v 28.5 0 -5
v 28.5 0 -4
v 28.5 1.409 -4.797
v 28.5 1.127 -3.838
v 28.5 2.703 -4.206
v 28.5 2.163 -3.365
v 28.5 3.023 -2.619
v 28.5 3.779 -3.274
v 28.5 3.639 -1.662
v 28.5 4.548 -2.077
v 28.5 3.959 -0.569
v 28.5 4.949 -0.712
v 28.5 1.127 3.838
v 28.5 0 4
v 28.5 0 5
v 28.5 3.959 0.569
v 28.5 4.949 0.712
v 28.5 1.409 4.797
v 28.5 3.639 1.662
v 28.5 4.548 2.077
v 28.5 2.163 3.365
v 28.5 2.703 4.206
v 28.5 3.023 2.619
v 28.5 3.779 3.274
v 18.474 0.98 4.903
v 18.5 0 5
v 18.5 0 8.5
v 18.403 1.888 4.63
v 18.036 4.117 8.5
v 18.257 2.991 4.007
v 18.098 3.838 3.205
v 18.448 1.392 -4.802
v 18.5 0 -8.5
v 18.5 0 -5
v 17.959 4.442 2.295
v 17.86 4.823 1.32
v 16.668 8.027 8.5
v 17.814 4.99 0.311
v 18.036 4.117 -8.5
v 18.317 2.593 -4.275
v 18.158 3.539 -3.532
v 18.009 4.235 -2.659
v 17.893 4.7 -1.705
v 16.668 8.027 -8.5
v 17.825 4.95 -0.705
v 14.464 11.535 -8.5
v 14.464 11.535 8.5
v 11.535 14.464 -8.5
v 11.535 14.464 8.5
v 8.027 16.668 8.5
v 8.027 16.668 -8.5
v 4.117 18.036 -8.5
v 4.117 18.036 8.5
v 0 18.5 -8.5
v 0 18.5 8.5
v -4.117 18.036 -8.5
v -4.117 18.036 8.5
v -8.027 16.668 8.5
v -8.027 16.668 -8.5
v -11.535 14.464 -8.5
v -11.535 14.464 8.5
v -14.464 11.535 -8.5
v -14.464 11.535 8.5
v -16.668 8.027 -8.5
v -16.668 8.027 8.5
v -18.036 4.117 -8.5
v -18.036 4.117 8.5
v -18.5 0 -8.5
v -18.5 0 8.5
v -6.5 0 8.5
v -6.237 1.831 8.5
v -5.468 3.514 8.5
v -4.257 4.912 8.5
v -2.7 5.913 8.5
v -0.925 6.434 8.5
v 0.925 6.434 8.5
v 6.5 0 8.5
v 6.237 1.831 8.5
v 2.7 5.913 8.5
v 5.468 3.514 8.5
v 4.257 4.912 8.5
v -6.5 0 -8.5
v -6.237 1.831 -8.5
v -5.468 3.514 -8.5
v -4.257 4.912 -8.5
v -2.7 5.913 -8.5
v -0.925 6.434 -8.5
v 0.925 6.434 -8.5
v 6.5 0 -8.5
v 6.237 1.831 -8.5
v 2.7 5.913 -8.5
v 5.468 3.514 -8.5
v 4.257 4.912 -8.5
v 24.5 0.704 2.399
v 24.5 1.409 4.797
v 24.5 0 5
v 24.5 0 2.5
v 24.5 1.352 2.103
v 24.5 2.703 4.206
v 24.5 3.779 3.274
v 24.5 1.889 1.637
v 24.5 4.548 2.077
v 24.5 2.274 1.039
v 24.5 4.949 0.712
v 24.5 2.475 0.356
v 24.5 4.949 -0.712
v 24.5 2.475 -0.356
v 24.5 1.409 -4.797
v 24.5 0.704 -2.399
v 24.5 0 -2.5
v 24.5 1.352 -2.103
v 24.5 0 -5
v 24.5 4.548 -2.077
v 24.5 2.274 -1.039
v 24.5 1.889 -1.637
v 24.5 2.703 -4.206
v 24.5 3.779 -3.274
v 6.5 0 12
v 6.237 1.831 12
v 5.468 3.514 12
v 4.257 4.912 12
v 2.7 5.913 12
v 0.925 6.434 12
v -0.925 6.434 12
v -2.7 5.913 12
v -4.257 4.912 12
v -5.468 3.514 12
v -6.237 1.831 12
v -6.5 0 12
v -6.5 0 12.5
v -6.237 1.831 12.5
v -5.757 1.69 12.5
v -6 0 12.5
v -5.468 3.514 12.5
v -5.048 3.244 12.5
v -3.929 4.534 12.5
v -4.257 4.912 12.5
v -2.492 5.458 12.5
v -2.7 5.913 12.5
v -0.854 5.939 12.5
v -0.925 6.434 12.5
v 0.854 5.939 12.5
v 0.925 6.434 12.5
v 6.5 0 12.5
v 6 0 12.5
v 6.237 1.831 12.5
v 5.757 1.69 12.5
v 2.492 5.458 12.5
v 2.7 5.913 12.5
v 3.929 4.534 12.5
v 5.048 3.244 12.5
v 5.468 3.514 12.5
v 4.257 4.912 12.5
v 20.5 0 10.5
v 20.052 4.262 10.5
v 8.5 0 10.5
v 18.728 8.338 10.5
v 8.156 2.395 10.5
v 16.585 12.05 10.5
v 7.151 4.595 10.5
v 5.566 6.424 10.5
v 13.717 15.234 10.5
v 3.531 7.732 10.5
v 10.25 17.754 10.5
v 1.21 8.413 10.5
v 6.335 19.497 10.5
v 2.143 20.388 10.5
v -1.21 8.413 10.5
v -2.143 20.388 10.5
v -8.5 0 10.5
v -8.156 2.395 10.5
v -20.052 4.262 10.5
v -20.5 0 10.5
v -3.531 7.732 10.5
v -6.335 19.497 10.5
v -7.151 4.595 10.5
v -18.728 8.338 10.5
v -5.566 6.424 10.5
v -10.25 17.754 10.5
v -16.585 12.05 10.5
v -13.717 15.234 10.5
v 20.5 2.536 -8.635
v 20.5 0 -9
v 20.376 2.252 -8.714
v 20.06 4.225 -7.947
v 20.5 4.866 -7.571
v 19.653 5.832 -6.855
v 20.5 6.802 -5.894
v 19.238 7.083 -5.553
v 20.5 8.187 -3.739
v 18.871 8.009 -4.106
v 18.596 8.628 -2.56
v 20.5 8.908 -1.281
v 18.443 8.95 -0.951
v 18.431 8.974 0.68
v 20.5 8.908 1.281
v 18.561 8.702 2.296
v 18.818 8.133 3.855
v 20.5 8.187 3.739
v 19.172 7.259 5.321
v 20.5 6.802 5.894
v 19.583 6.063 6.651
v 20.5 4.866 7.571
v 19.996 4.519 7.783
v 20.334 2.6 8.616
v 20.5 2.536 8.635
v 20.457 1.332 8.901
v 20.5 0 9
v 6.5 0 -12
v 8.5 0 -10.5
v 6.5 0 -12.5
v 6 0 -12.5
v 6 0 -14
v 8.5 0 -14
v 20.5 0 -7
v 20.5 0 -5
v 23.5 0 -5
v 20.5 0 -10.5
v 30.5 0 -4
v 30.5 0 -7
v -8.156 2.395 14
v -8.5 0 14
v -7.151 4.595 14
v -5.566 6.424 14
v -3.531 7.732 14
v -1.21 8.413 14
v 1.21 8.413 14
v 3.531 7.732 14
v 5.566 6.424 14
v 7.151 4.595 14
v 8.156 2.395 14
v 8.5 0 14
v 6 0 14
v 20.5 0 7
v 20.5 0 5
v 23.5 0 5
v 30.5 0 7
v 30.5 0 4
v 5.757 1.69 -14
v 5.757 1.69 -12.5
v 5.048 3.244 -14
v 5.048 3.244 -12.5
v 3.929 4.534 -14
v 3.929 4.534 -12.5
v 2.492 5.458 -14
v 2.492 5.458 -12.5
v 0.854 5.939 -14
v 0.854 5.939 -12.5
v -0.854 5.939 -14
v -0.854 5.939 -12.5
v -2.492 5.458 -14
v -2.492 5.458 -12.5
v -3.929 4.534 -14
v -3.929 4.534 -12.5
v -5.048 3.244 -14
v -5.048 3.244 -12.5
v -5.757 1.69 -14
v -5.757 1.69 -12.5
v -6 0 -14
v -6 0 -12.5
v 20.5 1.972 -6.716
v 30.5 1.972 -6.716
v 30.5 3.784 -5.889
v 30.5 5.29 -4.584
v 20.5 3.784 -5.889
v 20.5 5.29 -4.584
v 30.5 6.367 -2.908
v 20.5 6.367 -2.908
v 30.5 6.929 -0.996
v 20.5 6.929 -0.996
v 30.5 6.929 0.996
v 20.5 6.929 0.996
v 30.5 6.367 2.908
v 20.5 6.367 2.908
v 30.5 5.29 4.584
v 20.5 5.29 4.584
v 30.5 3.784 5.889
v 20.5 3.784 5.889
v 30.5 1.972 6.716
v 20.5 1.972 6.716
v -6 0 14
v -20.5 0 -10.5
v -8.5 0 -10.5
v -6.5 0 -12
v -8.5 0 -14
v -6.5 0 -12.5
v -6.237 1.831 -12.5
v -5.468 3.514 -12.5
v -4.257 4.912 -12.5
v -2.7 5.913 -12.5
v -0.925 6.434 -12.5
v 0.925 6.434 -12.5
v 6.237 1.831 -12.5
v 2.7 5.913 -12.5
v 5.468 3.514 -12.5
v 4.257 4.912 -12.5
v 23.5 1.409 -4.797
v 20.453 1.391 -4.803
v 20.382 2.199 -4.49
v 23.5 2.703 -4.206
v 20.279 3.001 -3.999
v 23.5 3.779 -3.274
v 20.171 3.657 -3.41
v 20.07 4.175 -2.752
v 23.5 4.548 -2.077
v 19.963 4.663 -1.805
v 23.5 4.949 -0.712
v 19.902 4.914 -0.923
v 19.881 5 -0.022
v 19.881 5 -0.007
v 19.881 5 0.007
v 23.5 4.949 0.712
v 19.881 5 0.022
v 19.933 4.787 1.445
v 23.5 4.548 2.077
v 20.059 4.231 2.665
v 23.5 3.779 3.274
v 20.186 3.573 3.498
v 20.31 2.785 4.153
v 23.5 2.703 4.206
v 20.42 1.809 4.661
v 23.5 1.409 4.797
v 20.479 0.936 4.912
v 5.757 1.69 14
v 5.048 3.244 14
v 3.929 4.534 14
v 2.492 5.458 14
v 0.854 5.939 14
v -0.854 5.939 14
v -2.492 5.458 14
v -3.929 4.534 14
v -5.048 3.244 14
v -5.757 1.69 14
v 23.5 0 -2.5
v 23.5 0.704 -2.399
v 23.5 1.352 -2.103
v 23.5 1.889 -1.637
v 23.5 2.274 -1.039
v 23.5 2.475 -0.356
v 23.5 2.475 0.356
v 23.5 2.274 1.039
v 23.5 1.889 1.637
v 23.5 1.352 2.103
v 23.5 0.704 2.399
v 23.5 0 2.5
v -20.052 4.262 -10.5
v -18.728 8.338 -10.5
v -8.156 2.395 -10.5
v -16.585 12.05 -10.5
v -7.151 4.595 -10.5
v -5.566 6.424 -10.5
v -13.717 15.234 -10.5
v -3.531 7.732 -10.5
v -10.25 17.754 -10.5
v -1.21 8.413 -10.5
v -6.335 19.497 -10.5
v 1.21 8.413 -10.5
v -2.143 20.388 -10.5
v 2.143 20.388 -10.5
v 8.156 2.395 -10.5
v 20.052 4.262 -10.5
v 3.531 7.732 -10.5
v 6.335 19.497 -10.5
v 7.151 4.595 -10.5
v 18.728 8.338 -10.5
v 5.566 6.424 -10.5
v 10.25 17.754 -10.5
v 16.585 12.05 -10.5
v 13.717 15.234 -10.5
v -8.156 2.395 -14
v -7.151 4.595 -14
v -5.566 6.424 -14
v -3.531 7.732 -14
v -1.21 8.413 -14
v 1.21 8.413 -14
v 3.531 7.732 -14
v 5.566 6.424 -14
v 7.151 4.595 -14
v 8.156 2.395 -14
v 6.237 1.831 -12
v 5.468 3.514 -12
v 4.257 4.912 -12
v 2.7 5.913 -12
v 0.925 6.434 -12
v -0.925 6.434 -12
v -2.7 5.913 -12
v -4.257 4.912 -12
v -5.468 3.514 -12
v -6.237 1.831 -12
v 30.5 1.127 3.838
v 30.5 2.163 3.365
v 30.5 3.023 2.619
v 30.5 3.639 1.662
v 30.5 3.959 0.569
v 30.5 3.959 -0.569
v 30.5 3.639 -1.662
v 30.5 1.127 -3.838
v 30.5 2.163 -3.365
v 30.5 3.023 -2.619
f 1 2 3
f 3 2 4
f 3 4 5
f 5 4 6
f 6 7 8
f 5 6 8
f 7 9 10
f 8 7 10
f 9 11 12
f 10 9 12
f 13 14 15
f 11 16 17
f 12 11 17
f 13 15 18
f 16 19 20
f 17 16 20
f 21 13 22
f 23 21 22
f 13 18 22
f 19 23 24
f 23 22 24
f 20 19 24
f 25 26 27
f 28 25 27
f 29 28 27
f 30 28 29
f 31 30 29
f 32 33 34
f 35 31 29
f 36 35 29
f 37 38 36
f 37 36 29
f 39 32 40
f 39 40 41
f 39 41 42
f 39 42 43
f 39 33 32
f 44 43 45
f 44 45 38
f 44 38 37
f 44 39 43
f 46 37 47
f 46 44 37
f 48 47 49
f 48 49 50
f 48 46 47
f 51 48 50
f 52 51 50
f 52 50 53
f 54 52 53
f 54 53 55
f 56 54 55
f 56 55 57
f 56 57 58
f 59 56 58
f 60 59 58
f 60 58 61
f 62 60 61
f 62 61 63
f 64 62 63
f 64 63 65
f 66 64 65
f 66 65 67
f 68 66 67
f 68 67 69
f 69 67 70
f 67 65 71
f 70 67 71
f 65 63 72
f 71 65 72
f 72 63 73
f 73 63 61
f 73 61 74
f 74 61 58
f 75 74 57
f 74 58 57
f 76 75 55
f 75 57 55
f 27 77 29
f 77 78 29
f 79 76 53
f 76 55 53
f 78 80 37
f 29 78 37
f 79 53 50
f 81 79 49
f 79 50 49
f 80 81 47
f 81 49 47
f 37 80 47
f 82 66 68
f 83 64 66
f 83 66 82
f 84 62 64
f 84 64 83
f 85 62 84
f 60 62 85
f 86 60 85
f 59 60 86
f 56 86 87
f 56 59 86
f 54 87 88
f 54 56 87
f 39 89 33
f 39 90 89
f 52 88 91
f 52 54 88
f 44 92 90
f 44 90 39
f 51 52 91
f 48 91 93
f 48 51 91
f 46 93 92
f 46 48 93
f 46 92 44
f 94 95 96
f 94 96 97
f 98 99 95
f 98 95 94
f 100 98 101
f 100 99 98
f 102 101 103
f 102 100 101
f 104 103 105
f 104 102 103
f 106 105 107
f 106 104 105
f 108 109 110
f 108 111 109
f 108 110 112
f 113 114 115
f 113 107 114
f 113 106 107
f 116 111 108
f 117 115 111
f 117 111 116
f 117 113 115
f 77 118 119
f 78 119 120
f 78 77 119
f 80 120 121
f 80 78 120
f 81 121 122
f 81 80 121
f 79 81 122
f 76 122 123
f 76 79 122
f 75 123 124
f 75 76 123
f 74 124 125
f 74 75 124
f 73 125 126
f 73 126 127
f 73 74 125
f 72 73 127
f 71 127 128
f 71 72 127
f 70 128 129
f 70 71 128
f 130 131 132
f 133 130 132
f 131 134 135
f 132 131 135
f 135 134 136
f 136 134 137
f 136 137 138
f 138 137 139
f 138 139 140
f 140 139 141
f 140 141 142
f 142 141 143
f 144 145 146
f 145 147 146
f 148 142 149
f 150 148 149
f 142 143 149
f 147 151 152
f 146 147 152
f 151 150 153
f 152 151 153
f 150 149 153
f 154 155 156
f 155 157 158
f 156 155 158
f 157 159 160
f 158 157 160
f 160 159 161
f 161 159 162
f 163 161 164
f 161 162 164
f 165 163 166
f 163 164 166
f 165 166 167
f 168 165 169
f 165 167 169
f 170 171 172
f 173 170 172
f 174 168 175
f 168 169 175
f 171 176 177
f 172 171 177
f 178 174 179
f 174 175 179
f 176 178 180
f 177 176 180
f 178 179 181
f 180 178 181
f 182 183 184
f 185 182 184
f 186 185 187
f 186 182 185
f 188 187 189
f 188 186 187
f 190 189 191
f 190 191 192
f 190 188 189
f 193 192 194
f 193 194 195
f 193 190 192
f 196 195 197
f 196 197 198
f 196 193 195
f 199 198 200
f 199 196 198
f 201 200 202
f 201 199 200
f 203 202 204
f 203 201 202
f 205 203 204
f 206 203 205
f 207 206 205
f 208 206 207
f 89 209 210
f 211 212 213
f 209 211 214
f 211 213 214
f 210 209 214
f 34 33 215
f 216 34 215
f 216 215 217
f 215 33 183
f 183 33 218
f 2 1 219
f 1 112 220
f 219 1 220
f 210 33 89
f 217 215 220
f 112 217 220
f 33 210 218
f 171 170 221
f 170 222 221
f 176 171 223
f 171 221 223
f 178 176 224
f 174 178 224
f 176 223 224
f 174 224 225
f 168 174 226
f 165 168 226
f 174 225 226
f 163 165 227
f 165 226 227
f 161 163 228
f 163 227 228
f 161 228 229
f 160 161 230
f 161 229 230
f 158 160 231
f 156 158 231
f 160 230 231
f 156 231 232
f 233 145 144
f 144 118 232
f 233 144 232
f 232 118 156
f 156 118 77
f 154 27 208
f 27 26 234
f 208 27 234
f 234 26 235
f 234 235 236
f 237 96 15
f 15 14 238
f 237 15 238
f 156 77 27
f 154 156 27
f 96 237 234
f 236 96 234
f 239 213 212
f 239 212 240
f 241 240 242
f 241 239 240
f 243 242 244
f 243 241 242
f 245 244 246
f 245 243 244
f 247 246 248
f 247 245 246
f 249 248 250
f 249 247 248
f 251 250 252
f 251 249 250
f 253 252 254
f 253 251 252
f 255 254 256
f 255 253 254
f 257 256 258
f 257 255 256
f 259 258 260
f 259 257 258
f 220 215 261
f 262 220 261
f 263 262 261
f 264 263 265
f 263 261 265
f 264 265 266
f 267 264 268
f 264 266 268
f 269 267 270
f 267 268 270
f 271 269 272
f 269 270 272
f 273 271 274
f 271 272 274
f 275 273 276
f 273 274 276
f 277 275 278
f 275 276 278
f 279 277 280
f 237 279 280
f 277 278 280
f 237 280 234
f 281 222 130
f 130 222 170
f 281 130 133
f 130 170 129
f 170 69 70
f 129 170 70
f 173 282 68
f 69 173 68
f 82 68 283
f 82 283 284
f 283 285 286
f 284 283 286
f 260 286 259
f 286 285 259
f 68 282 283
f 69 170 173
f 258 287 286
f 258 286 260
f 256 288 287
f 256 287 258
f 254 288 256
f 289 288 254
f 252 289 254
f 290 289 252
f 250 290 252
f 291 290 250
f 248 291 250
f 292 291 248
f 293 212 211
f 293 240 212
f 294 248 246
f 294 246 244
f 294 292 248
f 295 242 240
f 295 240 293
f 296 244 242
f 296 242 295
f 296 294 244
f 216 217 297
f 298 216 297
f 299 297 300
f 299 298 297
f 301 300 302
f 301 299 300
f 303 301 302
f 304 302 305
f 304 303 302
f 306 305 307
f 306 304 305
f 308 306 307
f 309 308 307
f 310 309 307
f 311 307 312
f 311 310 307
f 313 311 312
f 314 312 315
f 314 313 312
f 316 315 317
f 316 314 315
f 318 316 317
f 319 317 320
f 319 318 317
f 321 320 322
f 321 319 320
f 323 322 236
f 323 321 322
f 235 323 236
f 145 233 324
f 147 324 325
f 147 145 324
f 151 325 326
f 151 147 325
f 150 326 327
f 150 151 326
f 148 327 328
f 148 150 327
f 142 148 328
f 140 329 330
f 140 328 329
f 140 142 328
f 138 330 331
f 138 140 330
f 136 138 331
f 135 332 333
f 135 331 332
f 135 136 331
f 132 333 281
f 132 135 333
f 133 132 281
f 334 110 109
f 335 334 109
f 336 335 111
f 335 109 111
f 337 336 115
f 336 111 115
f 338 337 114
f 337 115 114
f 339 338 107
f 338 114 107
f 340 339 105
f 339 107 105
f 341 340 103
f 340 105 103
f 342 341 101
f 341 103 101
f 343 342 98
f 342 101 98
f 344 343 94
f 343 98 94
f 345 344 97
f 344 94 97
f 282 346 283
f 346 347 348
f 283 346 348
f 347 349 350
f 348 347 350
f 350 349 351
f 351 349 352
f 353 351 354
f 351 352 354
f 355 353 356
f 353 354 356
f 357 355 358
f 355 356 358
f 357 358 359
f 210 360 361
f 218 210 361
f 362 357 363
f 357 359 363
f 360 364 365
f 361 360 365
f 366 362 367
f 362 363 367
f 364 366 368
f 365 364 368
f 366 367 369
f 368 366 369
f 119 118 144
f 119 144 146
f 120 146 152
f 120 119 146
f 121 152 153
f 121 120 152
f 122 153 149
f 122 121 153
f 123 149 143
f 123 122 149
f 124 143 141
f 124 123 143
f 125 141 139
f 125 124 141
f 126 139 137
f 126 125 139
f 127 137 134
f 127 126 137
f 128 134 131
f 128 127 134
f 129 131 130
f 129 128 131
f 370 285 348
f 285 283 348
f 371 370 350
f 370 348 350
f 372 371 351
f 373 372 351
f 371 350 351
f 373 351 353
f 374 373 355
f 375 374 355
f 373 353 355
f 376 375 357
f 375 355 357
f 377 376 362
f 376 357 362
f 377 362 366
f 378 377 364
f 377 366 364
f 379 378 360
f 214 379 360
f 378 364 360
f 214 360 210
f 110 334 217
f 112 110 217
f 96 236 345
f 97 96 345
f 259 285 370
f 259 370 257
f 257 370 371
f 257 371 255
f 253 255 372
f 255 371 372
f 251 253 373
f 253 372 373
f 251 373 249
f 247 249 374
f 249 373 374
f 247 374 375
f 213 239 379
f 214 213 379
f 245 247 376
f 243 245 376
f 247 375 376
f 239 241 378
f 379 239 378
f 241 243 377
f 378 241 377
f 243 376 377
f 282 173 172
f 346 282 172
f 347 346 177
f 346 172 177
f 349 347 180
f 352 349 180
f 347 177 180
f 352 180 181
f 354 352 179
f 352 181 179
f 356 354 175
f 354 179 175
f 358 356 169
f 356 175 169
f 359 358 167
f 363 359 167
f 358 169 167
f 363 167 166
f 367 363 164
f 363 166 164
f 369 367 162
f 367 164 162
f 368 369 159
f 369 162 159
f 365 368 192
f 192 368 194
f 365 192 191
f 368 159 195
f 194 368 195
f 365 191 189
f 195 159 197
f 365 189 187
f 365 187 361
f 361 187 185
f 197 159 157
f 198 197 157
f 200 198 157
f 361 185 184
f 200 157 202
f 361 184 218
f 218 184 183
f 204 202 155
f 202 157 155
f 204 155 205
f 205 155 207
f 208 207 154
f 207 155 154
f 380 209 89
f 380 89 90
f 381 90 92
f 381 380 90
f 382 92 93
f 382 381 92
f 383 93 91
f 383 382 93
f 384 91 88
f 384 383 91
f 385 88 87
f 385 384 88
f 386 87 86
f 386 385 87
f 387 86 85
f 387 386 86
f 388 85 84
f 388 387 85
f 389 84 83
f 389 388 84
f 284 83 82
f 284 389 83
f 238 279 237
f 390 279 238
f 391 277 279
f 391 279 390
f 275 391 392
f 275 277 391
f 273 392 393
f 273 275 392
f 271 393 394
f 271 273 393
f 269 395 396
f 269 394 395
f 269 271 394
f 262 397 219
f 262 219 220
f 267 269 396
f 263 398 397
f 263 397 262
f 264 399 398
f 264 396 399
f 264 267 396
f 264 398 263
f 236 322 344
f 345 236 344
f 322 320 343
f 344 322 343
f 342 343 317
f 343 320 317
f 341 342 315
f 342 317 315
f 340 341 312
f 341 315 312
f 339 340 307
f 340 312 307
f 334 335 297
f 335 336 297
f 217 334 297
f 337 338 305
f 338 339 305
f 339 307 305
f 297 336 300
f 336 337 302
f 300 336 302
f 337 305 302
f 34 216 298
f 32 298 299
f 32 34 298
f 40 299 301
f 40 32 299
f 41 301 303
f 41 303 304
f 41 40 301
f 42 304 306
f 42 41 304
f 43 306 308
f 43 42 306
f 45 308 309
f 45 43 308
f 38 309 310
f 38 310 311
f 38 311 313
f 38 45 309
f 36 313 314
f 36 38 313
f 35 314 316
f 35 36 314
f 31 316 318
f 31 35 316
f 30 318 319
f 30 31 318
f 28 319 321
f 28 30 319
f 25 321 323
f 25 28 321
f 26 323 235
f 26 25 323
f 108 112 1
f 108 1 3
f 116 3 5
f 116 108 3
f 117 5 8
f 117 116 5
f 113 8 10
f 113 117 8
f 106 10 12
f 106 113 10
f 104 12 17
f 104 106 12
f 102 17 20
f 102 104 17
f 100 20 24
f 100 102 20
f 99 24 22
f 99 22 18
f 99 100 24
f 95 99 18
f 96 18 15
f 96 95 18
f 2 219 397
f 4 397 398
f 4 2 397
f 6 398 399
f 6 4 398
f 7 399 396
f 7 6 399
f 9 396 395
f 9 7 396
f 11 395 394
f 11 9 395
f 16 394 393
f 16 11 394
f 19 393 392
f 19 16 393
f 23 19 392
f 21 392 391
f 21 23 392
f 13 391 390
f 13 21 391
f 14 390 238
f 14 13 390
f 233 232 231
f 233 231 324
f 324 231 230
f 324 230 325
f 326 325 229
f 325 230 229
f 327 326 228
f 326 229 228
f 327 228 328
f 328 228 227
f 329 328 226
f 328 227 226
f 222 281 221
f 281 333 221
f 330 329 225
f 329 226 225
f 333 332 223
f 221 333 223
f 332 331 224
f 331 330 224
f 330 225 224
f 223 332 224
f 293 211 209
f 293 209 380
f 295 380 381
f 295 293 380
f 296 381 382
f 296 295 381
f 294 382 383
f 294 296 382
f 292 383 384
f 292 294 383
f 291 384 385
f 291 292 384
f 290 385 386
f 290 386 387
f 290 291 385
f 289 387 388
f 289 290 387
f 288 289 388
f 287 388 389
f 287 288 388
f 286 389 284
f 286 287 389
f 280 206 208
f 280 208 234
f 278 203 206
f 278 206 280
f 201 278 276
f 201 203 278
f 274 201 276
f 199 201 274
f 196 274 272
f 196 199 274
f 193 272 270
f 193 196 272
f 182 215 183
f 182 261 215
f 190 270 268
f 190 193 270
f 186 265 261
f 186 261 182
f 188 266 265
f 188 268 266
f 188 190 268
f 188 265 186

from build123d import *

# Parameters (mm, degrees)
REVOLVE1_ANGLE          = 180
SHELL1_START            = -8.5
SHELL1_DEPTH            = 17
SHELL1_START_2          = -12
SHELL1_2_DEPTH          = 24
CUT_EXTRUDE1_DEPTH      = 33.194720064
CUT_EXTRUDE1_DEPTH_BACK = 33.194720064
SKETCH3_R               = 6
BOSS_EXTRUDE1_REACH     = 49.93
SKETCH6_R               = 9
BOSS_EXTRUDE3_DEPTH     = 10
SHELL2_START            = 19.880907618
SHELL2_DEPTH            = 8.619092382
SHELL2_START_2          = -5.0000001
SHELL2_2_DEPTH          = 10.0000001
CUT_EXTRUDE2_REACH      = 41.326
SKETCH8_R               = 5
SKETCH9_R               = 4
CUT_EXTRUDE3_DEPTH      = 10
BOSS_EXTRUDE4_START     = -1
BOSS_EXTRUDE4_DEPTH     = 1
SKETCH11_R              = 2.5
CUT_EXTRUDE4_DEPTH      = 1
CUT_EXTRUDE6_DEPTH      = 12.5
CUT_EXTRUDE6_DEPTH_BACK = 12.5
SKETCH12_R              = 6.5


with BuildPart() as part:
    # Sketch2 → Revolve1 (revolve)
    with BuildSketch(Plane(origin=(0, 0, 0), x_dir=(1, 0, 0), z_dir=(0, 1, 0))):
        Polygon((0, 0), (0, 14), (-8.5, 14), (-8.5, 10.5), (-20.5, 10.5), (-20.5, 0), (-20.5, -10.5), (-8.5, -10.5), (-8.5, -14), (0, -14), align=None)
    revolve(axis=Axis((0, 0, 0), (0, 0, -1)), revolution_arc=REVOLVE1_ANGLE)

    # Shell1: read off the stored shape, not the designer's step
    # Shell1 outline → Shell1 (cut)
    with BuildSketch(Plane.XY.offset(SHELL1_START)):
        with BuildLine():
            ThreePointArc((18.5, 0), (0, 18.5), (-18.5, 0))
            Line((-18.5, 0), (18.5, 0))
        make_face()
    extrude(amount=SHELL1_DEPTH, mode=Mode.SUBTRACT)

    # Shell1 2 outline → Shell1 2 (cut)
    with BuildSketch(Plane.XY.offset(SHELL1_START_2)):
        with BuildLine():
            Line((-6.5, 0), (6.5, 0))
            ThreePointArc((6.5, 0), (0, 6.5), (-6.5, 0))
        make_face()
    extrude(amount=SHELL1_2_DEPTH, mode=Mode.SUBTRACT)

    # Sketch3 → Cut-Extrude1 (cut, two sides: drawn at the far end of the back side and taken through both)
    with BuildSketch(Plane.XY.offset(-CUT_EXTRUDE1_DEPTH_BACK)):
        Circle(SKETCH3_R)
    extrude(amount=CUT_EXTRUDE1_DEPTH + CUT_EXTRUDE1_DEPTH_BACK, mode=Mode.SUBTRACT)

    # Sketch6 → Boss-Extrude1 (add, up to next)
    with BuildSketch(Plane(origin=(20.5, 0, 0), x_dir=(0, 0, -1), z_dir=(1, 0, 0)), mode=Mode.PRIVATE) as boss_extrude1_sk1:
        Circle(SKETCH6_R)
    boss_extrude1_tool1 = extrude(boss_extrude1_sk1.sketch, amount=-BOSS_EXTRUDE1_REACH, mode=Mode.PRIVATE) - part.part
    add(boss_extrude1_tool1.solids().sort_by_distance((20.5, 0, 0))[0])

    # Sketch7 → Boss-Extrude3 (add)
    with BuildSketch(Plane(origin=(20.5, 0, 0), x_dir=(0, 0, -1), z_dir=(1, 0, 0))):
        with BuildLine():
            Line((-7, 0), (7, 0))
            ThreePointArc((7, 0), (0, 7), (-7, 0))
        make_face()
    extrude(amount=BOSS_EXTRUDE3_DEPTH)

    # Shell2: read off the stored shape, not the designer's step
    # Shell2 outline → Shell2 (cut)
    with BuildSketch(Plane.YZ.offset(SHELL2_START)):
        with BuildLine():
            ThreePointArc((0, -5), (5, 0), (0, 5))
            Line((0, 5), (0, -5))
        make_face()
    extrude(amount=SHELL2_DEPTH, mode=Mode.SUBTRACT)

    # Shell2 2 outline → Shell2 2 (add)
    with BuildSketch(Plane.XY.offset(SHELL2_START_2)):
        with BuildLine():
            Line((19.880896081, 4.999997099), (19.880907618, 0))
            Line((19.880907618, 0), (20.5, 0))
            ThreePointArc((20.5, 0), (20.344635284, 2.519090146), (19.880896081, 4.999997099))
        make_face()
    extrude(amount=SHELL2_2_DEPTH)

    # Sketch8 → Cut-Extrude2 (cut, up to next)
    with BuildSketch(Plane(origin=(0, 0, 0), x_dir=(0, 0, -1), z_dir=(1, 0, 0)), mode=Mode.PRIVATE) as cut_extrude2_sk1:
        Circle(SKETCH8_R)
    cut_extrude2_tool1 = extrude(cut_extrude2_sk1.sketch, amount=CUT_EXTRUDE2_REACH, mode=Mode.PRIVATE) & part.part
    add(cut_extrude2_tool1.solids().sort_by_distance((0, 0, 0))[0], mode=Mode.SUBTRACT)

    # Sketch9 → Cut-Extrude3 (cut)
    with BuildSketch(Plane(origin=(20.5, 0, 0), x_dir=(0, 0, -1), z_dir=(1, 0, 0))):
        Circle(SKETCH9_R)
    extrude(amount=CUT_EXTRUDE3_DEPTH, mode=Mode.SUBTRACT)

    # Sketch10 → Boss-Extrude4 (add)
    with BuildSketch(Plane(origin=(24.5, 0, 0), x_dir=(0, 0, -1), z_dir=(1, 0, 0)).offset(BOSS_EXTRUDE4_START)):
        with BuildLine():
            Line((-5, 0), (5, 0))
            ThreePointArc((5, 0), (0, 5), (-5, 0))
        make_face()
    extrude(amount=BOSS_EXTRUDE4_DEPTH)

    # Sketch11 → Cut-Extrude4 (cut)
    with BuildSketch(Plane(origin=(24.5, 0, 0), x_dir=(0, 0, -1), z_dir=(1, 0, 0))):
        Circle(SKETCH11_R)
    extrude(amount=-CUT_EXTRUDE4_DEPTH, mode=Mode.SUBTRACT)

    # Sketch12 → Cut-Extrude6 (cut, two sides: drawn at the far end of the back side and taken through both)
    with BuildSketch(Plane.XY.offset(-CUT_EXTRUDE6_DEPTH_BACK)):
        Circle(SKETCH12_R)
    extrude(amount=CUT_EXTRUDE6_DEPTH + CUT_EXTRUDE6_DEPTH_BACK, mode=Mode.SUBTRACT)


solid = part.part
